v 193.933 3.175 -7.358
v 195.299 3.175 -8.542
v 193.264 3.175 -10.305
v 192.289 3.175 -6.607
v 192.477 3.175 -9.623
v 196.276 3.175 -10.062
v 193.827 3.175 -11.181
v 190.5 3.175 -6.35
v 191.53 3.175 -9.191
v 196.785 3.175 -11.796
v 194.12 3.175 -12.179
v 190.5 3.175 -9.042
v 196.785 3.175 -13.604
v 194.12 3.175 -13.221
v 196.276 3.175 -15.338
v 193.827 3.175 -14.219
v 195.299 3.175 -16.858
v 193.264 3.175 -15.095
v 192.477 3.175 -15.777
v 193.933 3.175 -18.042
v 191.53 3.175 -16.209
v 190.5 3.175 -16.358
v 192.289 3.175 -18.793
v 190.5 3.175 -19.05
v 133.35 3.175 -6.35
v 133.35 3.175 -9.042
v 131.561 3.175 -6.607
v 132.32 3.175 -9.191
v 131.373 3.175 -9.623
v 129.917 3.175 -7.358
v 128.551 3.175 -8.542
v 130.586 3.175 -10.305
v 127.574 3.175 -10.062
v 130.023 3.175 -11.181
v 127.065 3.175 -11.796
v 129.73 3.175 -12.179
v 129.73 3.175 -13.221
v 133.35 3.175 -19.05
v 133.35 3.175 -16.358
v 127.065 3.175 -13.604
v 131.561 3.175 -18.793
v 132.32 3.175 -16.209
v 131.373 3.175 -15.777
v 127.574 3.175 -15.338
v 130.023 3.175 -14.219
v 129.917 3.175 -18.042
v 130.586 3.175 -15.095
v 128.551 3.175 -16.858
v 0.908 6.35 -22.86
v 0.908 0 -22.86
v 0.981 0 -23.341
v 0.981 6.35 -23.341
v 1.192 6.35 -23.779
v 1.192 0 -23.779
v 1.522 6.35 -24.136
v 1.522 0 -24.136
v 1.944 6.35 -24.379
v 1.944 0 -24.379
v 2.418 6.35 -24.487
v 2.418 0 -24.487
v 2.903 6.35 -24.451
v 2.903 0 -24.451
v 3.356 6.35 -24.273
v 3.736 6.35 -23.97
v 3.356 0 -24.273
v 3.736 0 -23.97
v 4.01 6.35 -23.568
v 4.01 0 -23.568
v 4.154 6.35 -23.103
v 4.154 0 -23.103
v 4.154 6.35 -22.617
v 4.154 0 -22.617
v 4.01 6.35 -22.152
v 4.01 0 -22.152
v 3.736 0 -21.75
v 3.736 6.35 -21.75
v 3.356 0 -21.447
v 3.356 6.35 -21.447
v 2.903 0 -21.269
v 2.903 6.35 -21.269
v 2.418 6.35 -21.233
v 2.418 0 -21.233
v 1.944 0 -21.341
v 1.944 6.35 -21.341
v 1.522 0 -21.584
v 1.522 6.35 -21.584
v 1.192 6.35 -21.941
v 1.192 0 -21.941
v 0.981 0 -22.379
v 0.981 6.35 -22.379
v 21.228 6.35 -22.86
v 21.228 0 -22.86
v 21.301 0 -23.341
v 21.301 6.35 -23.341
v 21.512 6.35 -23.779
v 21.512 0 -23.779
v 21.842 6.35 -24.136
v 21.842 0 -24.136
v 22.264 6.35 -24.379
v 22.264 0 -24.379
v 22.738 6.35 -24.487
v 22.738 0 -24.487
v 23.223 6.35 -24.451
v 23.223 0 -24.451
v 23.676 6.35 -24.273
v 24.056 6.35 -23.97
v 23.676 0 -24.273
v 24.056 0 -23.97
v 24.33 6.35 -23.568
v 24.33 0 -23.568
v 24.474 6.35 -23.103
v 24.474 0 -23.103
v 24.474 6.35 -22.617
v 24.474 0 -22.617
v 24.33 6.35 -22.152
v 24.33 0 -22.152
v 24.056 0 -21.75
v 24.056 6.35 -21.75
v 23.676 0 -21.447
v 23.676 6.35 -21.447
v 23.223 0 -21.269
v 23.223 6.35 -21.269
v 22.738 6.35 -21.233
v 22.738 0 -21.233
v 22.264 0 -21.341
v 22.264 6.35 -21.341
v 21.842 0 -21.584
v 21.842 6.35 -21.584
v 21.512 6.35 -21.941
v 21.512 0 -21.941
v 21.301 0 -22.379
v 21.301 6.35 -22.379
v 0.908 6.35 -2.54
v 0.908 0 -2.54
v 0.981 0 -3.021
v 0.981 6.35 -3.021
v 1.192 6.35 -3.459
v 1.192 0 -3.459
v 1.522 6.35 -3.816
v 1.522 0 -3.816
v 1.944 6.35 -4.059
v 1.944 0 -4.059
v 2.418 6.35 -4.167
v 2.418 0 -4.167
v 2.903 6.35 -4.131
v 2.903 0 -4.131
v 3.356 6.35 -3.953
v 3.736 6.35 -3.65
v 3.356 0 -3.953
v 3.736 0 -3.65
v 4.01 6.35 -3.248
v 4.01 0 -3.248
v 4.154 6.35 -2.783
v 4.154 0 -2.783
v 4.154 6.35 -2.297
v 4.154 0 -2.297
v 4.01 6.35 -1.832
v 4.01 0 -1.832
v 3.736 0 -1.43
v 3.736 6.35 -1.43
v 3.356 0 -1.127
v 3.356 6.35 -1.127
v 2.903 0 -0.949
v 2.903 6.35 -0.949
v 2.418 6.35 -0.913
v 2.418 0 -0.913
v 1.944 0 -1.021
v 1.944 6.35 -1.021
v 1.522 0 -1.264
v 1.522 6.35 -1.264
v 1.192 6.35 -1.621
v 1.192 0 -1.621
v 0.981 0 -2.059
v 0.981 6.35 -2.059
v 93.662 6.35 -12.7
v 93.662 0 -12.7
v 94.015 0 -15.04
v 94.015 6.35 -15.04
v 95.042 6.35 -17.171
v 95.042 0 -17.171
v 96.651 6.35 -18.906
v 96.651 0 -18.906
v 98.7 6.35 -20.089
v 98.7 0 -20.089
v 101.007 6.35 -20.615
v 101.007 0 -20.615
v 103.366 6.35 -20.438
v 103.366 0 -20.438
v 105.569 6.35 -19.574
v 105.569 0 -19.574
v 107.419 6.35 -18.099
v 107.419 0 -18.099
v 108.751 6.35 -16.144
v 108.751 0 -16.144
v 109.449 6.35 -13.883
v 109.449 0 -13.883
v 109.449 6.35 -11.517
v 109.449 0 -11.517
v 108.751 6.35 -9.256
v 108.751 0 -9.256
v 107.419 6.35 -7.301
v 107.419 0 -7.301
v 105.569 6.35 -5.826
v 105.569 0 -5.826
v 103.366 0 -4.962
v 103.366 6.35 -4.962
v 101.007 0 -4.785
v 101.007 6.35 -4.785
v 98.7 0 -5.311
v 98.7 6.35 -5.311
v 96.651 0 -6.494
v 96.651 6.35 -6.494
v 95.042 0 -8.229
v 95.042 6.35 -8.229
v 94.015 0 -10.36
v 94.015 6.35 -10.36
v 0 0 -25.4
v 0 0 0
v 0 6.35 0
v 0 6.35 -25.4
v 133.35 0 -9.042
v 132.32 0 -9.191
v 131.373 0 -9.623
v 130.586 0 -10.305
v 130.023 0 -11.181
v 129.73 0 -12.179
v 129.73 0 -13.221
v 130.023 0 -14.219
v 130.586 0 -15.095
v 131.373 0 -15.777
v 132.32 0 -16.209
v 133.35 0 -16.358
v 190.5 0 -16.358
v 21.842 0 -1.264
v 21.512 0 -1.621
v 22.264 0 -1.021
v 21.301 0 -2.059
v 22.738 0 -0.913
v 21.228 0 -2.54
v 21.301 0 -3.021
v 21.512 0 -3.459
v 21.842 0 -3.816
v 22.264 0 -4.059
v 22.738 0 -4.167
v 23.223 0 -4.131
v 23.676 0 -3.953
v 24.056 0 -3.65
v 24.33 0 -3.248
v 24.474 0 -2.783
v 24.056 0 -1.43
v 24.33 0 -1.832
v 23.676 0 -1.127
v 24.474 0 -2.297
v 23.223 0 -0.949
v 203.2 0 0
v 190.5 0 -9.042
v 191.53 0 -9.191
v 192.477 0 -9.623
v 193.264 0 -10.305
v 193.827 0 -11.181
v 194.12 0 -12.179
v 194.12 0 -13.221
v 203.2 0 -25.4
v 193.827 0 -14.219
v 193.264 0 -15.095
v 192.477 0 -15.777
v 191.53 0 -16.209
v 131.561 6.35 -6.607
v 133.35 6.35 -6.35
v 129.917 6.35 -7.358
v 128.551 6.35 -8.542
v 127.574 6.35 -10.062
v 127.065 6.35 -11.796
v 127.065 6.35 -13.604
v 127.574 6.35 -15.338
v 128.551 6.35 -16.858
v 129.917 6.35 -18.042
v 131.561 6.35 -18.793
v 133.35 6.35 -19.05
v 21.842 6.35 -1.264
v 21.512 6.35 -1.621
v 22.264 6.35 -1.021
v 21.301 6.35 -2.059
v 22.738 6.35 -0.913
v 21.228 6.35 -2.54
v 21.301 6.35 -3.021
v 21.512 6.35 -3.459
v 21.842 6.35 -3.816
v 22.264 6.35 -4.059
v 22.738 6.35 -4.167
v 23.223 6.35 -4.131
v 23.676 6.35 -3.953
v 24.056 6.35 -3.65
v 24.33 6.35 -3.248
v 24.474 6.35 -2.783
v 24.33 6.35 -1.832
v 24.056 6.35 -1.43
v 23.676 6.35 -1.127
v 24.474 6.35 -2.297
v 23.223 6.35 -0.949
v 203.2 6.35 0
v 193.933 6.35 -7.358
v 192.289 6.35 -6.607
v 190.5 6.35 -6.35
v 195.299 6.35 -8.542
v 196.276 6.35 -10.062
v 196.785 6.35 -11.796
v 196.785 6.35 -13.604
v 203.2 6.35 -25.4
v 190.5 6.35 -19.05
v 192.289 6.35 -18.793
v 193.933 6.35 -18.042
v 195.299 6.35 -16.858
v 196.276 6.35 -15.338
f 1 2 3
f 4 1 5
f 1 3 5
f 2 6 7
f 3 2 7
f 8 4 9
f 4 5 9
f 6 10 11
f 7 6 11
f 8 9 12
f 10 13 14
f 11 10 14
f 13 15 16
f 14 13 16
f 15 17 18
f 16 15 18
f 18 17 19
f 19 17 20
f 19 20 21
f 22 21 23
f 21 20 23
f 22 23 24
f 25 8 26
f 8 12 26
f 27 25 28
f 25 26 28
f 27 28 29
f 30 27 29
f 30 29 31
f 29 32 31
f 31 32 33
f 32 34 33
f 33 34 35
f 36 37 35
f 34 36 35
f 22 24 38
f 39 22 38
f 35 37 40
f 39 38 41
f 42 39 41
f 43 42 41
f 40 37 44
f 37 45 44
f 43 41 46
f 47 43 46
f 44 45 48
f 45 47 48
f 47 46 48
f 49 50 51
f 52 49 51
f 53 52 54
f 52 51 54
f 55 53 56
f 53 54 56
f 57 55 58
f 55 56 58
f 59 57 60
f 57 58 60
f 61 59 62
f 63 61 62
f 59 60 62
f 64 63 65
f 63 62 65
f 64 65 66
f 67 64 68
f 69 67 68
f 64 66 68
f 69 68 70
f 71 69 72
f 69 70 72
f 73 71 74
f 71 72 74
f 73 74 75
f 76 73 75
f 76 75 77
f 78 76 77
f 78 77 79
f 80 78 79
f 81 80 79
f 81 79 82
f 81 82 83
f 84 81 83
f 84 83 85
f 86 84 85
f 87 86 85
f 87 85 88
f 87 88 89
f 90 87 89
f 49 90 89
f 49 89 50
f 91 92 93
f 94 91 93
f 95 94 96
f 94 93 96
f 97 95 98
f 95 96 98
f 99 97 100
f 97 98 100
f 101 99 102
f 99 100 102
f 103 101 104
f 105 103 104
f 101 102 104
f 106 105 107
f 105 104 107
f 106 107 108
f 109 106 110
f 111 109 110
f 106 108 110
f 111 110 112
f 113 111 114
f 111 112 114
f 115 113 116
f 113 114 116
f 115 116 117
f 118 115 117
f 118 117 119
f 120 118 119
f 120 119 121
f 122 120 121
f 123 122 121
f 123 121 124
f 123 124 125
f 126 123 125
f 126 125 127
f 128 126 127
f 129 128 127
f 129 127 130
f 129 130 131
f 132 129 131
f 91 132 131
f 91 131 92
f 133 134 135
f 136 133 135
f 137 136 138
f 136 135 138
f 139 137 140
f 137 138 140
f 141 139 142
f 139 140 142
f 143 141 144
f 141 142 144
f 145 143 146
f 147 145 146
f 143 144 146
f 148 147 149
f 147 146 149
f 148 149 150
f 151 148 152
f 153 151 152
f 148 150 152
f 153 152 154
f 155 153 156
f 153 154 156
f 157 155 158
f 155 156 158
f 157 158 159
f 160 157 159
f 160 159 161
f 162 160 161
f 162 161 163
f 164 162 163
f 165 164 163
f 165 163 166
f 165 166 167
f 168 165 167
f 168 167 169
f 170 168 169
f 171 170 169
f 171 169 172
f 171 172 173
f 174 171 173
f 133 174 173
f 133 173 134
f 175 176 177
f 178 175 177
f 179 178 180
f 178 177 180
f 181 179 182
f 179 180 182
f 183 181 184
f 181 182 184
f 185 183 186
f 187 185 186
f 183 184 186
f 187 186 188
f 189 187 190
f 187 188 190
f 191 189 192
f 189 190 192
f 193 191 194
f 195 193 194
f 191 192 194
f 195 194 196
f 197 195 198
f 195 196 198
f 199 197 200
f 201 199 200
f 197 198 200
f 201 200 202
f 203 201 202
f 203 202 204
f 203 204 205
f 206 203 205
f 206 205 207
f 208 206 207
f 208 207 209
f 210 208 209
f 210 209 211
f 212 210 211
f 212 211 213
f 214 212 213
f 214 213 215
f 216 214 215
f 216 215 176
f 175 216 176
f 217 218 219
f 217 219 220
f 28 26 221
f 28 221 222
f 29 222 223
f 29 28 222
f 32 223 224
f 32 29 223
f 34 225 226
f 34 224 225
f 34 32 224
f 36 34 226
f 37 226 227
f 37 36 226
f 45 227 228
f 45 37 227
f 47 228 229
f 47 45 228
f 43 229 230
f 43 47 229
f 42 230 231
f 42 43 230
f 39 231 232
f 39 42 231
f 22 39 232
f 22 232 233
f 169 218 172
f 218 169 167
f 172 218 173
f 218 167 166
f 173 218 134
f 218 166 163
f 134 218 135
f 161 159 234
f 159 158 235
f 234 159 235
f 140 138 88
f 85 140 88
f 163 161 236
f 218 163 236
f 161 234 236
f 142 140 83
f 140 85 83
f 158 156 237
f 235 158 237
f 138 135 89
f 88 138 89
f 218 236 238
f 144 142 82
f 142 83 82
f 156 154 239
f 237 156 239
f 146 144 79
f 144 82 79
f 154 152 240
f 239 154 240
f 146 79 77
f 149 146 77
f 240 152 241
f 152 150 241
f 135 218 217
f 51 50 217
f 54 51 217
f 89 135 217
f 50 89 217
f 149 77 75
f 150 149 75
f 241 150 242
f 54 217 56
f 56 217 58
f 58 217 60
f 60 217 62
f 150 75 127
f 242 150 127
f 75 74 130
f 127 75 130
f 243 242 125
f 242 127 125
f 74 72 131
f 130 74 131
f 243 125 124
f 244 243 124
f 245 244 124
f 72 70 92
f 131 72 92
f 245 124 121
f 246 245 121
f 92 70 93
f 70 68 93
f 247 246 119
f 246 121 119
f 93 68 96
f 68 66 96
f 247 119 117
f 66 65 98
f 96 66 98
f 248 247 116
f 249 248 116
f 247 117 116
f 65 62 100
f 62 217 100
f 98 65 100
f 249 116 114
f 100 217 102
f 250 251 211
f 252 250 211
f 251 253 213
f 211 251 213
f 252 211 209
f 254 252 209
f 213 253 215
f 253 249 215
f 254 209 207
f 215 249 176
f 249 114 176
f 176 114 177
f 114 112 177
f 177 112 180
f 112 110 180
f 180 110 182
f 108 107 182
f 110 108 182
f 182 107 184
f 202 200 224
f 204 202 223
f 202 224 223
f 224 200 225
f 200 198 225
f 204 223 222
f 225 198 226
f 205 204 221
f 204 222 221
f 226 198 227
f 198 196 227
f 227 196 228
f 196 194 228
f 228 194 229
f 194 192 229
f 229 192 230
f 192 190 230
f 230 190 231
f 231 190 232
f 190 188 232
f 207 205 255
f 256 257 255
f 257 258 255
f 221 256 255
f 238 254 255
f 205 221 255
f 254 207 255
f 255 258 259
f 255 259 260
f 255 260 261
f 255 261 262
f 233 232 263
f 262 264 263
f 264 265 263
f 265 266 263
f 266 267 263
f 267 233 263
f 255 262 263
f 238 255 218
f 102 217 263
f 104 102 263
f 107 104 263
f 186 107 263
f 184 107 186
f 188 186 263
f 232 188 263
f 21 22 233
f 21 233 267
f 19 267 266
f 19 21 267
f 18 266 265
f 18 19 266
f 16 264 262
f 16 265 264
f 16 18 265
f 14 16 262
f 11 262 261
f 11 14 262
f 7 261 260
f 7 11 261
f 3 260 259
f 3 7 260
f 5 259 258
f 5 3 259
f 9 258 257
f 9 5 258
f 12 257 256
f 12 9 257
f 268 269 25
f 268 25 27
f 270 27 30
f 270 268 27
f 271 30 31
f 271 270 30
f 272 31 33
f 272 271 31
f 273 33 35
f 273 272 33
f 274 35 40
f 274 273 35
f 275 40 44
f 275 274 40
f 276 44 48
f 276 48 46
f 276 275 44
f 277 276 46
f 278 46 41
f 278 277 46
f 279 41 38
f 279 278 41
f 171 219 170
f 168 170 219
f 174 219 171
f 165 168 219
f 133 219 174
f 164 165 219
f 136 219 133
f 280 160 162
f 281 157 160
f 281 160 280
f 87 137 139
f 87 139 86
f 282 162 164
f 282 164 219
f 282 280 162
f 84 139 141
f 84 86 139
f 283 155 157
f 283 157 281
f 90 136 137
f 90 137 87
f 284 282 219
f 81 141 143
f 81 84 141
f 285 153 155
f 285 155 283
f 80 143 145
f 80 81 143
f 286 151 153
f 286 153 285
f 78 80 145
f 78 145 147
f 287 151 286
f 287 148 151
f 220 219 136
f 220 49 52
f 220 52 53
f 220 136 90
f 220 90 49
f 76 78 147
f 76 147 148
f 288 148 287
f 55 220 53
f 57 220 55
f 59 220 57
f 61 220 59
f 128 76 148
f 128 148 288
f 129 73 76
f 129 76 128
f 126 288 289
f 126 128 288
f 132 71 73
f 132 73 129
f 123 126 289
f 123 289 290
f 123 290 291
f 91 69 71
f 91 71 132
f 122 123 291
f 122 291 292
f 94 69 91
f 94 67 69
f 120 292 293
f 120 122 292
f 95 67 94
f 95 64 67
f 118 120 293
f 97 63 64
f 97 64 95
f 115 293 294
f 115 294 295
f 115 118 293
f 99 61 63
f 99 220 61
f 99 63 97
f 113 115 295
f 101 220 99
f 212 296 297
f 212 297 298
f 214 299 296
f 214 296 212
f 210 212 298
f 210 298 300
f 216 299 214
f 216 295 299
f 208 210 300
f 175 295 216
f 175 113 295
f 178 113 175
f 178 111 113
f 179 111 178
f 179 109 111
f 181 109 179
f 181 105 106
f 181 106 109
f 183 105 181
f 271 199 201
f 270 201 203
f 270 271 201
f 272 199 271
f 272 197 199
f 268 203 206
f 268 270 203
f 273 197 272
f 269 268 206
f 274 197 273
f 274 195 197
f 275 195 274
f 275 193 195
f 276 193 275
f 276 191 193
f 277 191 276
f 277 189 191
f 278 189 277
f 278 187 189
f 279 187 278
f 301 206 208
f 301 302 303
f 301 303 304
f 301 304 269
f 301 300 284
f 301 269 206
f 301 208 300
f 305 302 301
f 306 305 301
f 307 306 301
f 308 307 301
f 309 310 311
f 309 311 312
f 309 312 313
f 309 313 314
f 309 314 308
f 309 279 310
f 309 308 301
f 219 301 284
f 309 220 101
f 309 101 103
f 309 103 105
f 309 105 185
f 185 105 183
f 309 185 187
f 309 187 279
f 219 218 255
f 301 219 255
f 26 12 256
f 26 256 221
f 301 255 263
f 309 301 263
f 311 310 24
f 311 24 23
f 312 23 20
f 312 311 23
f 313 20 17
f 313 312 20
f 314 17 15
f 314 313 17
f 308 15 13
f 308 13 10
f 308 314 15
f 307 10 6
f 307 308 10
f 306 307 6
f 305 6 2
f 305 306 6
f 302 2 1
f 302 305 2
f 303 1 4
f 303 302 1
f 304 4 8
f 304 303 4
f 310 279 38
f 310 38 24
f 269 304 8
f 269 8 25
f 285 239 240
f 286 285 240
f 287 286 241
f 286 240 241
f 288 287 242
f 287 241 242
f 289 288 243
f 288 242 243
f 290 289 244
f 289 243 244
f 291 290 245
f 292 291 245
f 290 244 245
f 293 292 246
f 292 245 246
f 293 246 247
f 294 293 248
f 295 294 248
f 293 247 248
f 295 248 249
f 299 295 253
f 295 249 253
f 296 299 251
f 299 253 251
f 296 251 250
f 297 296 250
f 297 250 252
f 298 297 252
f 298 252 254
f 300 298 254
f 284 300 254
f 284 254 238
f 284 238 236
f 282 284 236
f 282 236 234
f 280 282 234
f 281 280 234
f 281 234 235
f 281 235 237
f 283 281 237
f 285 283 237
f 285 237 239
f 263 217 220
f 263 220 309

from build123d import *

# Parameters (mm, degrees)
SKETCH1_W                        = 203.2
SKETCH1_H                        = 25.4
BOSS_EXTRUDE1_DEPTH              = 6.35
F_5_8_0_625_DIAMETER_HOLE1_D     = 15.875
F_5_8_0_625_DIAMETER_HOLE1_DEPTH = 25.4
F_5_8_0_625_DIAMETER_HOLE1_TIP   = 4.769331164
CUT_EXTRUDE1_DEPTH               = 7.35
CUT_EXTRUDE2_DEPTH               = 3.175
F_4_CLEARANCE_HOLE1_D            = 3.2639


with BuildPart() as part:
    # Sketch1 → Boss-Extrude1 (new body)
    with BuildSketch(Plane(origin=(0, 0, 0), x_dir=(1, 0, 0), z_dir=(0, 1, 0))):
        with Locations((101.6, 12.7)):
            Rectangle(SKETCH1_W, SKETCH1_H)
    extrude(amount=BOSS_EXTRUDE1_DEPTH)

    # 5/8 (0.625) Diameter Hole1
    with Locations(Plane(origin=(0, 6.35, 0), x_dir=(1, 0, 0), z_dir=(0, 1, 0))):
        with Locations((101.6, 12.7)):
            Hole(F_5_8_0_625_DIAMETER_HOLE1_D / 2, depth=F_5_8_0_625_DIAMETER_HOLE1_DEPTH)
            with Locations((0, 0, -(F_5_8_0_625_DIAMETER_HOLE1_DEPTH + F_5_8_0_625_DIAMETER_HOLE1_TIP / 2))):  # 118° drill point
                Cone(0, F_5_8_0_625_DIAMETER_HOLE1_D / 2, F_5_8_0_625_DIAMETER_HOLE1_TIP, mode=Mode.SUBTRACT)

    # Sketch6 → Cut-Extrude1 (cut, through all)
    with BuildSketch(Plane(origin=(0, 6.35, 0), x_dir=(1, 0, 0), z_dir=(0, 1, 0))):
        with BuildLine():
            Line((133.35, 16.3576), (190.5, 16.3576))
            ThreePointArc((190.5, 16.3576), (194.1576, 12.7), (190.5, 9.0424))
            Line((190.5, 9.0424), (133.35, 9.0424))
            ThreePointArc((133.35, 9.0424), (129.6924, 12.7), (133.35, 16.3576))
        make_face()
    extrude(amount=-CUT_EXTRUDE1_DEPTH, mode=Mode.SUBTRACT)

    # Sketch7 → Cut-Extrude2 (cut)
    with BuildSketch(Plane(origin=(0, 6.35, 0), x_dir=(1, 0, 0), z_dir=(0, 1, 0))):
        with BuildLine():
            Line((190.5, 6.35), (133.35, 6.35))
            ThreePointArc((133.35, 6.35), (127, 12.7), (133.35, 19.05))
            Line((133.35, 19.05), (190.5, 19.05))
            ThreePointArc((190.5, 19.05), (196.85, 12.7), (190.5, 6.35))
        make_face()
    extrude(amount=-CUT_EXTRUDE2_DEPTH, mode=Mode.SUBTRACT)

    # #4 Clearance Hole1 (through all)
    with Locations(Plane(origin=(0, 6.35, 0), x_dir=(1, 0, 0), z_dir=(0, 1, 0))):
        with Locations((2.54, 22.86), (22.86, 22.86), (22.86, 2.54), (2.54, 2.54)):
            Hole(F_4_CLEARANCE_HOLE1_D / 2)


solid = part.part
